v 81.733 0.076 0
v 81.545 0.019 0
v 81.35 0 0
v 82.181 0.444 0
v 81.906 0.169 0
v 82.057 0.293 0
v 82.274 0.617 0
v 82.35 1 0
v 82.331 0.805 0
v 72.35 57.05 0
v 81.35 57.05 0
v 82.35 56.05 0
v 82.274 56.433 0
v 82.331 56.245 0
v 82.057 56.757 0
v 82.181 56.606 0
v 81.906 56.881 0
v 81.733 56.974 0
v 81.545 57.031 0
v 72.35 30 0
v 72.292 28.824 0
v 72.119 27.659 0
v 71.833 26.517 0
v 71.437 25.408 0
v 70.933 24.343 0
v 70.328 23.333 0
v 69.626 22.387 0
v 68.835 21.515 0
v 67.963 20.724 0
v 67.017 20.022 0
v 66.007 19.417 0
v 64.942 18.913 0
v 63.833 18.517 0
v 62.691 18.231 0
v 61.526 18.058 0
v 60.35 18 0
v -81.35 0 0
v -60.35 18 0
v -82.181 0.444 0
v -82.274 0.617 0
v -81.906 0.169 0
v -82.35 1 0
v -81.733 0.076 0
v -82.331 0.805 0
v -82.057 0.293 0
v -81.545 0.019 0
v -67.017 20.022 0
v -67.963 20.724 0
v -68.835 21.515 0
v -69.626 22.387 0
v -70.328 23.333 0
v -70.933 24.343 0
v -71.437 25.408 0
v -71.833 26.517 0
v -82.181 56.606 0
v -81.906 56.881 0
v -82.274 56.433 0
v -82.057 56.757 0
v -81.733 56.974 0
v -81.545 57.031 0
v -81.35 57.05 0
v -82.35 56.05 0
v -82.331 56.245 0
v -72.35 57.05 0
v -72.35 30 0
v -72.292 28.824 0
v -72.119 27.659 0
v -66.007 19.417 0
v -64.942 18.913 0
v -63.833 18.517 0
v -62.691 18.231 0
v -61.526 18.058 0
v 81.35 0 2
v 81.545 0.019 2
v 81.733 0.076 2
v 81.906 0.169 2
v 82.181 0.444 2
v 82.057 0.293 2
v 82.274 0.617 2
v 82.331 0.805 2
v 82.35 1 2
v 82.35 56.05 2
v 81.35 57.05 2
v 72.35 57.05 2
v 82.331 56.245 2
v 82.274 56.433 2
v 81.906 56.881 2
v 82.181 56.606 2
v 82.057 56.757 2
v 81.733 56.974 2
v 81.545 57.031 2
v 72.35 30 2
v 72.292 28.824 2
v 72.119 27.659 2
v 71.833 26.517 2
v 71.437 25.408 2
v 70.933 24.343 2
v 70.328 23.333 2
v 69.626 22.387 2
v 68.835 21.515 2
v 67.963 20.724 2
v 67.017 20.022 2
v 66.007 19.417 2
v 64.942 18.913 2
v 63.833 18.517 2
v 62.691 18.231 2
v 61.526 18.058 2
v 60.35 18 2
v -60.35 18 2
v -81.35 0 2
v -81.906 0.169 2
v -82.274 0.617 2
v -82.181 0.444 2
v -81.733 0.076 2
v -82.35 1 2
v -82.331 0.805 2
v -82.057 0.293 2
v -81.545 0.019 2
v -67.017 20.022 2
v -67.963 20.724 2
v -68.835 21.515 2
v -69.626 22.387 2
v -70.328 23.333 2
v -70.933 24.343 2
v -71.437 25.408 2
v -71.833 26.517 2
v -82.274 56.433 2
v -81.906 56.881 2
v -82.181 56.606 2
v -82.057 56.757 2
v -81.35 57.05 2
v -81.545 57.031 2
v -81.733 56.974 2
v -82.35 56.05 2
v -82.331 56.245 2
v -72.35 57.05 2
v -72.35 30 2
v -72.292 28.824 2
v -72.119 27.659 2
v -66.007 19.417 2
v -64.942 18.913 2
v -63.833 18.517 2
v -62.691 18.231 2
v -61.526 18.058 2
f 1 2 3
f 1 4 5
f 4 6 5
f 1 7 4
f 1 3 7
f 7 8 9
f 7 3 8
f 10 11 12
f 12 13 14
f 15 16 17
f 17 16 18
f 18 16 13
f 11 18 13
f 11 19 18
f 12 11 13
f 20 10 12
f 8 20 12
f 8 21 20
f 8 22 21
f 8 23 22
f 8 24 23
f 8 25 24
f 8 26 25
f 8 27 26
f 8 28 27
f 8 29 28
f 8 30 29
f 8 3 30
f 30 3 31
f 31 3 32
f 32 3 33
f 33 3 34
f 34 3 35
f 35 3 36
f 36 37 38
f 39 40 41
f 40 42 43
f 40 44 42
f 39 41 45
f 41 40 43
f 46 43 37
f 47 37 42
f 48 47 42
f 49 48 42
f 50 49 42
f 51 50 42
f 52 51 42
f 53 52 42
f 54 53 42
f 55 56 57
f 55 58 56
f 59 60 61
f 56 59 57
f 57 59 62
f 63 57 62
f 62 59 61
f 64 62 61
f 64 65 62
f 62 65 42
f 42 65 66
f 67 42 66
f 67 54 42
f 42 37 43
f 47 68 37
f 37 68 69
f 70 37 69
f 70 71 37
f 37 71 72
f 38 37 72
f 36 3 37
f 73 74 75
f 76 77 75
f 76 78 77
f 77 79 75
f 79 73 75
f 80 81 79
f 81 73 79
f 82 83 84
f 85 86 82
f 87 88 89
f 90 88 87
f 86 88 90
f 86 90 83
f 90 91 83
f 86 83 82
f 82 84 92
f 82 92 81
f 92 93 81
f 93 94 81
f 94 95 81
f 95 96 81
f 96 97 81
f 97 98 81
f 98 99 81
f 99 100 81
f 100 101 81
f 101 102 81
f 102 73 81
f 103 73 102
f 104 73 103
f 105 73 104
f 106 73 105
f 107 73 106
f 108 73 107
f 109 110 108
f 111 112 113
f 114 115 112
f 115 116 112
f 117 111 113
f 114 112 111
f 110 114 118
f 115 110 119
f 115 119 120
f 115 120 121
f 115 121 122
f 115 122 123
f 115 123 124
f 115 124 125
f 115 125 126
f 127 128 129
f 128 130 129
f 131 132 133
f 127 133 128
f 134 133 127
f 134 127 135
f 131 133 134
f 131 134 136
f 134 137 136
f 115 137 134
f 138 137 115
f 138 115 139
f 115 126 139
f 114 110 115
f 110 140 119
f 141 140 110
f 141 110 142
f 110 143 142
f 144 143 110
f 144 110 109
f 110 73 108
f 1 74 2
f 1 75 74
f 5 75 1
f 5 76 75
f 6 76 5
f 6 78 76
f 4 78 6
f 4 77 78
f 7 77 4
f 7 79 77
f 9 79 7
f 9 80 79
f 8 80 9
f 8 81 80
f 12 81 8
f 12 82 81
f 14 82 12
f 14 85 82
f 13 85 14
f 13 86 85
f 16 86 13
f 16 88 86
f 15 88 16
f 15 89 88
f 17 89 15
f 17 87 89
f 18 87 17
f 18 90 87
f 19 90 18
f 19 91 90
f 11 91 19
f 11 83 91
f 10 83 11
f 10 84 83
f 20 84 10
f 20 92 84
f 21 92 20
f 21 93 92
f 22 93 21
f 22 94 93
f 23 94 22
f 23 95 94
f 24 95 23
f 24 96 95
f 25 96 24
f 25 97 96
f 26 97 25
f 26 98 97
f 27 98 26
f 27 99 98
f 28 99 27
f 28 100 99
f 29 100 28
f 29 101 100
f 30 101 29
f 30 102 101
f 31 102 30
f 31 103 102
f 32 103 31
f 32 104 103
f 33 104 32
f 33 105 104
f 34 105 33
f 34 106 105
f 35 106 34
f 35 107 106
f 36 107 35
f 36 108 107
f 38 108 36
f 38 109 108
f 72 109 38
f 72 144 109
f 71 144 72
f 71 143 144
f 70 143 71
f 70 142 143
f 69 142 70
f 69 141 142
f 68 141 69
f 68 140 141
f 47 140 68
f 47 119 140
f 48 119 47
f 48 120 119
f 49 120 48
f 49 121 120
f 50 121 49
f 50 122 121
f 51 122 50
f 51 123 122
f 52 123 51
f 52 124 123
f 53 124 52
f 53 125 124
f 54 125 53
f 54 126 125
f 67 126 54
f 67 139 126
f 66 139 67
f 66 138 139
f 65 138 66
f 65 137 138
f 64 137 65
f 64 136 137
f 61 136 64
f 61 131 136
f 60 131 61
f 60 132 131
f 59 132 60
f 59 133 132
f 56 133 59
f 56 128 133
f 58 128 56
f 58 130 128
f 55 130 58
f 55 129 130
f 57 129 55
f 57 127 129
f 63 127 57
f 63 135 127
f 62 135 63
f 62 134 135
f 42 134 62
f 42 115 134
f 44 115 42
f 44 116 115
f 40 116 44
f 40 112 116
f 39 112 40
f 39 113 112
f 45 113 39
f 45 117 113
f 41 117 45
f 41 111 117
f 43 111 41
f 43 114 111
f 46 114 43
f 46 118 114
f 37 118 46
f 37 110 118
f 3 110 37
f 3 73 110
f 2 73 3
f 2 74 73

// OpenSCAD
// file: ../../../../modules/gridfinity.scad
// Gridfinity ベースプレートの共有 module。
// 寸法は Gridfinity 仕様 (Zack Freedman) の baseplate 輪郭に従う:
//   ピッチ 42、ソケット上端開口 41.5 (角 R4)、上から 45° 面取り 2.15 →
//   垂直 1.8 (37.2 角・R1.85) → 45° 面取り 0.7 → 底 35.8 角 (R1.15)。
//   ソケット深さ = 2.15 + 1.8 + 0.7 = 4.65。
//
// 座標系: X が列方向 (中央が 0)、Y が行方向 (板の前端が 0)、Z=0 が板の底面。
// 板の外形は grid とは独立に rim で与えるので、grid より大きい板 (縁付き) を
// 作れる。ソケットは rim=[left, right, front, back] の内側へ 42 ピッチで並ぶ。

gf_pitch = 42;
gf_socket_top = 41.5; // 上端開口
gf_socket_mid = 37.2; // 垂直部
gf_socket_bot = 35.8; // 底
gf_socket_r_top = 4;
gf_socket_r_mid = 1.85;
gf_socket_r_bot = 1.15;
gf_chamfer_top = 2.15;
gf_wall_h = 1.8;
gf_chamfer_bot = 0.7;
gf_socket_depth = gf_chamfer_top + gf_wall_h + gf_chamfer_bot; // 4.65
gf_fn = 32;
gf_eps = 0.01; // hull 用の薄板の厚さ
gf_over = 0.5; // 切削の抜き代

// 角丸正方形または矩形 (w は一辺、または [幅, 奥行き]、角 R)
module
gf_rounded_square(w, r)
{
    offset(r = r, $fn = gf_fn)
        square(is_list(w) ? w - [ 2 * r, 2 * r ] : w - 2 * r, center = true);
}

// 厚さ gf_eps の角丸正方形の薄板を z に置く (hull の骨)
module
gf_slab(w, r, z)
{
    translate([ 0, 0, z ]) linear_extrude(gf_eps) gf_rounded_square(w, r);
}

// ソケット1個の切削体。z=0 がソケットの底 (床の天面)、+Z へ 4.65 で天面に出る。
// clearance は嵌合の逃げで、輪郭を全周へ clearance だけ外へ出す (幅 +2c、角 R
// +c)。pitch_x は X 方向のセル幅。端数でも角 R と面取りの寸法を保つ。
module
gf_socket_cut(clearance = 0, pitch_x = gf_pitch)
{
    z1 = gf_chamfer_bot;
    z2 = z1 + gf_wall_h;
    z3 = gf_socket_depth;
    c = clearance;
    assert(pitch_x > gf_pitch - gf_socket_top + 2 * gf_socket_r_top,
           "Cell width is too small for the socket corner radius");
    delta = [ pitch_x - gf_pitch, 0 ];
    bot = [ gf_socket_bot + 2 * c, gf_socket_bot + 2 * c ] + delta;
    mid = [ gf_socket_mid + 2 * c, gf_socket_mid + 2 * c ] + delta;
    top = [ gf_socket_top + 2 * c, gf_socket_top + 2 * c ] + delta;
    hull()
    {
        gf_slab(bot, gf_socket_r_bot + c, 0);
        gf_slab(mid, gf_socket_r_mid + c, z1 - gf_eps);
    }
    hull()
    {
        gf_slab(mid, gf_socket_r_mid + c, z1 - gf_eps);
        gf_slab(mid, gf_socket_r_mid + c, z2 - gf_eps);
    }
    hull()
    {
        gf_slab(mid, gf_socket_r_mid + c, z2 - gf_eps);
        gf_slab(top, gf_socket_r_top + c, z3 - gf_eps);
    }
    // 天面より上へ抜く (天面と同一平面の退化した面を残さない)
    gf_slab(top, gf_socket_r_top + c, z3 - gf_eps);
    translate([ 0, 0, z3 - gf_eps ]) linear_extrude(gf_over + gf_eps)
        gf_rounded_square(top, gf_socket_r_top + c);
}

// ベースプレート。cols x rows のソケットを床 floor_t の上に彫る。
// rim = [left, right, front, back] はソケット列の外側に残す縁の幅。
// 板の幅 = cols*42 + left + right、奥行き = rows*42 + front + back。
// cols の端数は左端の細幅セルになる。rows は正の整数。
// clearance はソケットの嵌合の逃げ (gf_socket_cut を参照)。
module
gf_baseplate(cols, rows, rim = [ 0, 0, 0, 0 ], floor_t = 1, clearance = 0)
{
    grid_w = cols * gf_pitch;
    grid_d = rows * gf_pitch;
    plate_w = grid_w + rim[0] + rim[1];
    plate_d = grid_d + rim[2] + rim[3];
    x0 = -plate_w / 2 + rim[0]; // ソケット列の左端
    first_pitch = grid_w - (ceil(cols) - 1) * gf_pitch;
    difference()
    {
        translate([ -plate_w / 2, 0, 0 ])
            cube([ plate_w, plate_d, floor_t + gf_socket_depth ]);
        for (c = [0:ceil(cols) - 1], r = [0:rows - 1])
            translate([
                x0 + (c == 0 ? first_pitch / 2
                             : first_pitch + (c - 0.5) * gf_pitch),
                rim[2] + (r + 0.5) * gf_pitch,
                floor_t
            ]) gf_socket_cut(clearance, c == 0 ? first_pitch : gf_pitch);
    }
}
// file: ../../../../modules/gridfinity_cable_holder.scad
include <gridfinity_bin.scad>

// 天馬用。STLの初期配置で横5.5マス、奥行rowsマス、左半セル。
gfc_cols = 5.5;
gfc_units = 9;
gfc_wall = 1.2;
gfc_floor_t = 1.2;
gfc_pitch = 10;
gfc_slot_count = 22;
gfc_plate_t = 2;
gfc_slot_clearance = 0.4; // 板厚に足す総量。実プリントで調整する
gfc_slot_depth = 2;
gfc_end_clearance = 0.2; // 板の前後端と溝底の片側の余裕
gfc_leg = 10;
gfc_notch_floor = 18;
gfc_notch_r = 12;

gfc_width = gfc_cols * gf_pitch - 0.5;
gfc_floor_top = gfb_base_h + gfc_floor_t;
gfc_top = gfc_units * gfb_unit + gfb_lip_h;
gfc_plate_h = gfc_units * gfb_unit - gfc_floor_top;

function gfc_depth(rows) = rows * gf_pitch - 0.5;
function gfc_divider_length(rows) =
    gfc_depth(rows) - 2 * (gfc_wall + gfc_end_clearance);

// ラベル棚は設けず、前後の補強壁の内側へ上端まで開いた溝を作る。
module gfc_holder(rows)
{
    depth = gfc_depth(rows);
    slot_w = gfc_plate_t + gfc_slot_clearance;
    difference()
    {
        union()
        {
            gfb_bin(gfc_cols, rows, gfc_units, gfc_wall, gfc_floor_t);
            intersection()
            {
                translate([ 0, 0, gfc_floor_top - gf_eps ])
                    linear_extrude(gfc_top - gfc_floor_top + gf_eps)
                        gfb_footprint(gfc_cols, rows);
                for (y = [ 0, depth - gfc_wall - gfc_slot_depth ])
                    translate([ -gfc_width / 2, y, gfc_floor_top - gf_eps ])
                        cube([ gfc_width, gfc_wall + gfc_slot_depth,
                               gfc_top - gfc_floor_top + gf_eps ]);
            }
        }
        for (i = [0:gfc_slot_count - 1], rear = [0:1])
            translate([
                (i - (gfc_slot_count - 1) / 2) * gfc_pitch - slot_w / 2,
                rear ? depth - gfc_wall - gfc_slot_depth - gf_over : gfc_wall,
                gfc_floor_top
            ]) cube([ slot_w, gfc_slot_depth + gf_over,
                      gfc_top - gfc_floor_top + gf_over ]);
    }
}

// 単品を平置きで印刷する。長辺が前後方向、高さ方向にU字を開ける。
// 組立時は床z=5.95に載り、板上端はz=63（リップより4.4mm低い）。
module gfc_divider(rows)
{
    length = gfc_divider_length(rows);
    linear_extrude(gfc_plate_t) difference()
    {
        translate([ 0, gfc_plate_h / 2 ])
            gf_rounded_square_wd(length, gfc_plate_h, 1);
        translate([ -length / 2 + gfc_leg + gfc_notch_r,
                    gfc_notch_floor + gfc_notch_r ])
            offset(r = gfc_notch_r, $fn = gf_fn * 2)
                square([ length - 2 * (gfc_leg + gfc_notch_r), gfc_plate_h ]);
    }
}
// main file
include <../../../../modules/gridfinity_cable_holder.scad>

gfc_divider(4);
